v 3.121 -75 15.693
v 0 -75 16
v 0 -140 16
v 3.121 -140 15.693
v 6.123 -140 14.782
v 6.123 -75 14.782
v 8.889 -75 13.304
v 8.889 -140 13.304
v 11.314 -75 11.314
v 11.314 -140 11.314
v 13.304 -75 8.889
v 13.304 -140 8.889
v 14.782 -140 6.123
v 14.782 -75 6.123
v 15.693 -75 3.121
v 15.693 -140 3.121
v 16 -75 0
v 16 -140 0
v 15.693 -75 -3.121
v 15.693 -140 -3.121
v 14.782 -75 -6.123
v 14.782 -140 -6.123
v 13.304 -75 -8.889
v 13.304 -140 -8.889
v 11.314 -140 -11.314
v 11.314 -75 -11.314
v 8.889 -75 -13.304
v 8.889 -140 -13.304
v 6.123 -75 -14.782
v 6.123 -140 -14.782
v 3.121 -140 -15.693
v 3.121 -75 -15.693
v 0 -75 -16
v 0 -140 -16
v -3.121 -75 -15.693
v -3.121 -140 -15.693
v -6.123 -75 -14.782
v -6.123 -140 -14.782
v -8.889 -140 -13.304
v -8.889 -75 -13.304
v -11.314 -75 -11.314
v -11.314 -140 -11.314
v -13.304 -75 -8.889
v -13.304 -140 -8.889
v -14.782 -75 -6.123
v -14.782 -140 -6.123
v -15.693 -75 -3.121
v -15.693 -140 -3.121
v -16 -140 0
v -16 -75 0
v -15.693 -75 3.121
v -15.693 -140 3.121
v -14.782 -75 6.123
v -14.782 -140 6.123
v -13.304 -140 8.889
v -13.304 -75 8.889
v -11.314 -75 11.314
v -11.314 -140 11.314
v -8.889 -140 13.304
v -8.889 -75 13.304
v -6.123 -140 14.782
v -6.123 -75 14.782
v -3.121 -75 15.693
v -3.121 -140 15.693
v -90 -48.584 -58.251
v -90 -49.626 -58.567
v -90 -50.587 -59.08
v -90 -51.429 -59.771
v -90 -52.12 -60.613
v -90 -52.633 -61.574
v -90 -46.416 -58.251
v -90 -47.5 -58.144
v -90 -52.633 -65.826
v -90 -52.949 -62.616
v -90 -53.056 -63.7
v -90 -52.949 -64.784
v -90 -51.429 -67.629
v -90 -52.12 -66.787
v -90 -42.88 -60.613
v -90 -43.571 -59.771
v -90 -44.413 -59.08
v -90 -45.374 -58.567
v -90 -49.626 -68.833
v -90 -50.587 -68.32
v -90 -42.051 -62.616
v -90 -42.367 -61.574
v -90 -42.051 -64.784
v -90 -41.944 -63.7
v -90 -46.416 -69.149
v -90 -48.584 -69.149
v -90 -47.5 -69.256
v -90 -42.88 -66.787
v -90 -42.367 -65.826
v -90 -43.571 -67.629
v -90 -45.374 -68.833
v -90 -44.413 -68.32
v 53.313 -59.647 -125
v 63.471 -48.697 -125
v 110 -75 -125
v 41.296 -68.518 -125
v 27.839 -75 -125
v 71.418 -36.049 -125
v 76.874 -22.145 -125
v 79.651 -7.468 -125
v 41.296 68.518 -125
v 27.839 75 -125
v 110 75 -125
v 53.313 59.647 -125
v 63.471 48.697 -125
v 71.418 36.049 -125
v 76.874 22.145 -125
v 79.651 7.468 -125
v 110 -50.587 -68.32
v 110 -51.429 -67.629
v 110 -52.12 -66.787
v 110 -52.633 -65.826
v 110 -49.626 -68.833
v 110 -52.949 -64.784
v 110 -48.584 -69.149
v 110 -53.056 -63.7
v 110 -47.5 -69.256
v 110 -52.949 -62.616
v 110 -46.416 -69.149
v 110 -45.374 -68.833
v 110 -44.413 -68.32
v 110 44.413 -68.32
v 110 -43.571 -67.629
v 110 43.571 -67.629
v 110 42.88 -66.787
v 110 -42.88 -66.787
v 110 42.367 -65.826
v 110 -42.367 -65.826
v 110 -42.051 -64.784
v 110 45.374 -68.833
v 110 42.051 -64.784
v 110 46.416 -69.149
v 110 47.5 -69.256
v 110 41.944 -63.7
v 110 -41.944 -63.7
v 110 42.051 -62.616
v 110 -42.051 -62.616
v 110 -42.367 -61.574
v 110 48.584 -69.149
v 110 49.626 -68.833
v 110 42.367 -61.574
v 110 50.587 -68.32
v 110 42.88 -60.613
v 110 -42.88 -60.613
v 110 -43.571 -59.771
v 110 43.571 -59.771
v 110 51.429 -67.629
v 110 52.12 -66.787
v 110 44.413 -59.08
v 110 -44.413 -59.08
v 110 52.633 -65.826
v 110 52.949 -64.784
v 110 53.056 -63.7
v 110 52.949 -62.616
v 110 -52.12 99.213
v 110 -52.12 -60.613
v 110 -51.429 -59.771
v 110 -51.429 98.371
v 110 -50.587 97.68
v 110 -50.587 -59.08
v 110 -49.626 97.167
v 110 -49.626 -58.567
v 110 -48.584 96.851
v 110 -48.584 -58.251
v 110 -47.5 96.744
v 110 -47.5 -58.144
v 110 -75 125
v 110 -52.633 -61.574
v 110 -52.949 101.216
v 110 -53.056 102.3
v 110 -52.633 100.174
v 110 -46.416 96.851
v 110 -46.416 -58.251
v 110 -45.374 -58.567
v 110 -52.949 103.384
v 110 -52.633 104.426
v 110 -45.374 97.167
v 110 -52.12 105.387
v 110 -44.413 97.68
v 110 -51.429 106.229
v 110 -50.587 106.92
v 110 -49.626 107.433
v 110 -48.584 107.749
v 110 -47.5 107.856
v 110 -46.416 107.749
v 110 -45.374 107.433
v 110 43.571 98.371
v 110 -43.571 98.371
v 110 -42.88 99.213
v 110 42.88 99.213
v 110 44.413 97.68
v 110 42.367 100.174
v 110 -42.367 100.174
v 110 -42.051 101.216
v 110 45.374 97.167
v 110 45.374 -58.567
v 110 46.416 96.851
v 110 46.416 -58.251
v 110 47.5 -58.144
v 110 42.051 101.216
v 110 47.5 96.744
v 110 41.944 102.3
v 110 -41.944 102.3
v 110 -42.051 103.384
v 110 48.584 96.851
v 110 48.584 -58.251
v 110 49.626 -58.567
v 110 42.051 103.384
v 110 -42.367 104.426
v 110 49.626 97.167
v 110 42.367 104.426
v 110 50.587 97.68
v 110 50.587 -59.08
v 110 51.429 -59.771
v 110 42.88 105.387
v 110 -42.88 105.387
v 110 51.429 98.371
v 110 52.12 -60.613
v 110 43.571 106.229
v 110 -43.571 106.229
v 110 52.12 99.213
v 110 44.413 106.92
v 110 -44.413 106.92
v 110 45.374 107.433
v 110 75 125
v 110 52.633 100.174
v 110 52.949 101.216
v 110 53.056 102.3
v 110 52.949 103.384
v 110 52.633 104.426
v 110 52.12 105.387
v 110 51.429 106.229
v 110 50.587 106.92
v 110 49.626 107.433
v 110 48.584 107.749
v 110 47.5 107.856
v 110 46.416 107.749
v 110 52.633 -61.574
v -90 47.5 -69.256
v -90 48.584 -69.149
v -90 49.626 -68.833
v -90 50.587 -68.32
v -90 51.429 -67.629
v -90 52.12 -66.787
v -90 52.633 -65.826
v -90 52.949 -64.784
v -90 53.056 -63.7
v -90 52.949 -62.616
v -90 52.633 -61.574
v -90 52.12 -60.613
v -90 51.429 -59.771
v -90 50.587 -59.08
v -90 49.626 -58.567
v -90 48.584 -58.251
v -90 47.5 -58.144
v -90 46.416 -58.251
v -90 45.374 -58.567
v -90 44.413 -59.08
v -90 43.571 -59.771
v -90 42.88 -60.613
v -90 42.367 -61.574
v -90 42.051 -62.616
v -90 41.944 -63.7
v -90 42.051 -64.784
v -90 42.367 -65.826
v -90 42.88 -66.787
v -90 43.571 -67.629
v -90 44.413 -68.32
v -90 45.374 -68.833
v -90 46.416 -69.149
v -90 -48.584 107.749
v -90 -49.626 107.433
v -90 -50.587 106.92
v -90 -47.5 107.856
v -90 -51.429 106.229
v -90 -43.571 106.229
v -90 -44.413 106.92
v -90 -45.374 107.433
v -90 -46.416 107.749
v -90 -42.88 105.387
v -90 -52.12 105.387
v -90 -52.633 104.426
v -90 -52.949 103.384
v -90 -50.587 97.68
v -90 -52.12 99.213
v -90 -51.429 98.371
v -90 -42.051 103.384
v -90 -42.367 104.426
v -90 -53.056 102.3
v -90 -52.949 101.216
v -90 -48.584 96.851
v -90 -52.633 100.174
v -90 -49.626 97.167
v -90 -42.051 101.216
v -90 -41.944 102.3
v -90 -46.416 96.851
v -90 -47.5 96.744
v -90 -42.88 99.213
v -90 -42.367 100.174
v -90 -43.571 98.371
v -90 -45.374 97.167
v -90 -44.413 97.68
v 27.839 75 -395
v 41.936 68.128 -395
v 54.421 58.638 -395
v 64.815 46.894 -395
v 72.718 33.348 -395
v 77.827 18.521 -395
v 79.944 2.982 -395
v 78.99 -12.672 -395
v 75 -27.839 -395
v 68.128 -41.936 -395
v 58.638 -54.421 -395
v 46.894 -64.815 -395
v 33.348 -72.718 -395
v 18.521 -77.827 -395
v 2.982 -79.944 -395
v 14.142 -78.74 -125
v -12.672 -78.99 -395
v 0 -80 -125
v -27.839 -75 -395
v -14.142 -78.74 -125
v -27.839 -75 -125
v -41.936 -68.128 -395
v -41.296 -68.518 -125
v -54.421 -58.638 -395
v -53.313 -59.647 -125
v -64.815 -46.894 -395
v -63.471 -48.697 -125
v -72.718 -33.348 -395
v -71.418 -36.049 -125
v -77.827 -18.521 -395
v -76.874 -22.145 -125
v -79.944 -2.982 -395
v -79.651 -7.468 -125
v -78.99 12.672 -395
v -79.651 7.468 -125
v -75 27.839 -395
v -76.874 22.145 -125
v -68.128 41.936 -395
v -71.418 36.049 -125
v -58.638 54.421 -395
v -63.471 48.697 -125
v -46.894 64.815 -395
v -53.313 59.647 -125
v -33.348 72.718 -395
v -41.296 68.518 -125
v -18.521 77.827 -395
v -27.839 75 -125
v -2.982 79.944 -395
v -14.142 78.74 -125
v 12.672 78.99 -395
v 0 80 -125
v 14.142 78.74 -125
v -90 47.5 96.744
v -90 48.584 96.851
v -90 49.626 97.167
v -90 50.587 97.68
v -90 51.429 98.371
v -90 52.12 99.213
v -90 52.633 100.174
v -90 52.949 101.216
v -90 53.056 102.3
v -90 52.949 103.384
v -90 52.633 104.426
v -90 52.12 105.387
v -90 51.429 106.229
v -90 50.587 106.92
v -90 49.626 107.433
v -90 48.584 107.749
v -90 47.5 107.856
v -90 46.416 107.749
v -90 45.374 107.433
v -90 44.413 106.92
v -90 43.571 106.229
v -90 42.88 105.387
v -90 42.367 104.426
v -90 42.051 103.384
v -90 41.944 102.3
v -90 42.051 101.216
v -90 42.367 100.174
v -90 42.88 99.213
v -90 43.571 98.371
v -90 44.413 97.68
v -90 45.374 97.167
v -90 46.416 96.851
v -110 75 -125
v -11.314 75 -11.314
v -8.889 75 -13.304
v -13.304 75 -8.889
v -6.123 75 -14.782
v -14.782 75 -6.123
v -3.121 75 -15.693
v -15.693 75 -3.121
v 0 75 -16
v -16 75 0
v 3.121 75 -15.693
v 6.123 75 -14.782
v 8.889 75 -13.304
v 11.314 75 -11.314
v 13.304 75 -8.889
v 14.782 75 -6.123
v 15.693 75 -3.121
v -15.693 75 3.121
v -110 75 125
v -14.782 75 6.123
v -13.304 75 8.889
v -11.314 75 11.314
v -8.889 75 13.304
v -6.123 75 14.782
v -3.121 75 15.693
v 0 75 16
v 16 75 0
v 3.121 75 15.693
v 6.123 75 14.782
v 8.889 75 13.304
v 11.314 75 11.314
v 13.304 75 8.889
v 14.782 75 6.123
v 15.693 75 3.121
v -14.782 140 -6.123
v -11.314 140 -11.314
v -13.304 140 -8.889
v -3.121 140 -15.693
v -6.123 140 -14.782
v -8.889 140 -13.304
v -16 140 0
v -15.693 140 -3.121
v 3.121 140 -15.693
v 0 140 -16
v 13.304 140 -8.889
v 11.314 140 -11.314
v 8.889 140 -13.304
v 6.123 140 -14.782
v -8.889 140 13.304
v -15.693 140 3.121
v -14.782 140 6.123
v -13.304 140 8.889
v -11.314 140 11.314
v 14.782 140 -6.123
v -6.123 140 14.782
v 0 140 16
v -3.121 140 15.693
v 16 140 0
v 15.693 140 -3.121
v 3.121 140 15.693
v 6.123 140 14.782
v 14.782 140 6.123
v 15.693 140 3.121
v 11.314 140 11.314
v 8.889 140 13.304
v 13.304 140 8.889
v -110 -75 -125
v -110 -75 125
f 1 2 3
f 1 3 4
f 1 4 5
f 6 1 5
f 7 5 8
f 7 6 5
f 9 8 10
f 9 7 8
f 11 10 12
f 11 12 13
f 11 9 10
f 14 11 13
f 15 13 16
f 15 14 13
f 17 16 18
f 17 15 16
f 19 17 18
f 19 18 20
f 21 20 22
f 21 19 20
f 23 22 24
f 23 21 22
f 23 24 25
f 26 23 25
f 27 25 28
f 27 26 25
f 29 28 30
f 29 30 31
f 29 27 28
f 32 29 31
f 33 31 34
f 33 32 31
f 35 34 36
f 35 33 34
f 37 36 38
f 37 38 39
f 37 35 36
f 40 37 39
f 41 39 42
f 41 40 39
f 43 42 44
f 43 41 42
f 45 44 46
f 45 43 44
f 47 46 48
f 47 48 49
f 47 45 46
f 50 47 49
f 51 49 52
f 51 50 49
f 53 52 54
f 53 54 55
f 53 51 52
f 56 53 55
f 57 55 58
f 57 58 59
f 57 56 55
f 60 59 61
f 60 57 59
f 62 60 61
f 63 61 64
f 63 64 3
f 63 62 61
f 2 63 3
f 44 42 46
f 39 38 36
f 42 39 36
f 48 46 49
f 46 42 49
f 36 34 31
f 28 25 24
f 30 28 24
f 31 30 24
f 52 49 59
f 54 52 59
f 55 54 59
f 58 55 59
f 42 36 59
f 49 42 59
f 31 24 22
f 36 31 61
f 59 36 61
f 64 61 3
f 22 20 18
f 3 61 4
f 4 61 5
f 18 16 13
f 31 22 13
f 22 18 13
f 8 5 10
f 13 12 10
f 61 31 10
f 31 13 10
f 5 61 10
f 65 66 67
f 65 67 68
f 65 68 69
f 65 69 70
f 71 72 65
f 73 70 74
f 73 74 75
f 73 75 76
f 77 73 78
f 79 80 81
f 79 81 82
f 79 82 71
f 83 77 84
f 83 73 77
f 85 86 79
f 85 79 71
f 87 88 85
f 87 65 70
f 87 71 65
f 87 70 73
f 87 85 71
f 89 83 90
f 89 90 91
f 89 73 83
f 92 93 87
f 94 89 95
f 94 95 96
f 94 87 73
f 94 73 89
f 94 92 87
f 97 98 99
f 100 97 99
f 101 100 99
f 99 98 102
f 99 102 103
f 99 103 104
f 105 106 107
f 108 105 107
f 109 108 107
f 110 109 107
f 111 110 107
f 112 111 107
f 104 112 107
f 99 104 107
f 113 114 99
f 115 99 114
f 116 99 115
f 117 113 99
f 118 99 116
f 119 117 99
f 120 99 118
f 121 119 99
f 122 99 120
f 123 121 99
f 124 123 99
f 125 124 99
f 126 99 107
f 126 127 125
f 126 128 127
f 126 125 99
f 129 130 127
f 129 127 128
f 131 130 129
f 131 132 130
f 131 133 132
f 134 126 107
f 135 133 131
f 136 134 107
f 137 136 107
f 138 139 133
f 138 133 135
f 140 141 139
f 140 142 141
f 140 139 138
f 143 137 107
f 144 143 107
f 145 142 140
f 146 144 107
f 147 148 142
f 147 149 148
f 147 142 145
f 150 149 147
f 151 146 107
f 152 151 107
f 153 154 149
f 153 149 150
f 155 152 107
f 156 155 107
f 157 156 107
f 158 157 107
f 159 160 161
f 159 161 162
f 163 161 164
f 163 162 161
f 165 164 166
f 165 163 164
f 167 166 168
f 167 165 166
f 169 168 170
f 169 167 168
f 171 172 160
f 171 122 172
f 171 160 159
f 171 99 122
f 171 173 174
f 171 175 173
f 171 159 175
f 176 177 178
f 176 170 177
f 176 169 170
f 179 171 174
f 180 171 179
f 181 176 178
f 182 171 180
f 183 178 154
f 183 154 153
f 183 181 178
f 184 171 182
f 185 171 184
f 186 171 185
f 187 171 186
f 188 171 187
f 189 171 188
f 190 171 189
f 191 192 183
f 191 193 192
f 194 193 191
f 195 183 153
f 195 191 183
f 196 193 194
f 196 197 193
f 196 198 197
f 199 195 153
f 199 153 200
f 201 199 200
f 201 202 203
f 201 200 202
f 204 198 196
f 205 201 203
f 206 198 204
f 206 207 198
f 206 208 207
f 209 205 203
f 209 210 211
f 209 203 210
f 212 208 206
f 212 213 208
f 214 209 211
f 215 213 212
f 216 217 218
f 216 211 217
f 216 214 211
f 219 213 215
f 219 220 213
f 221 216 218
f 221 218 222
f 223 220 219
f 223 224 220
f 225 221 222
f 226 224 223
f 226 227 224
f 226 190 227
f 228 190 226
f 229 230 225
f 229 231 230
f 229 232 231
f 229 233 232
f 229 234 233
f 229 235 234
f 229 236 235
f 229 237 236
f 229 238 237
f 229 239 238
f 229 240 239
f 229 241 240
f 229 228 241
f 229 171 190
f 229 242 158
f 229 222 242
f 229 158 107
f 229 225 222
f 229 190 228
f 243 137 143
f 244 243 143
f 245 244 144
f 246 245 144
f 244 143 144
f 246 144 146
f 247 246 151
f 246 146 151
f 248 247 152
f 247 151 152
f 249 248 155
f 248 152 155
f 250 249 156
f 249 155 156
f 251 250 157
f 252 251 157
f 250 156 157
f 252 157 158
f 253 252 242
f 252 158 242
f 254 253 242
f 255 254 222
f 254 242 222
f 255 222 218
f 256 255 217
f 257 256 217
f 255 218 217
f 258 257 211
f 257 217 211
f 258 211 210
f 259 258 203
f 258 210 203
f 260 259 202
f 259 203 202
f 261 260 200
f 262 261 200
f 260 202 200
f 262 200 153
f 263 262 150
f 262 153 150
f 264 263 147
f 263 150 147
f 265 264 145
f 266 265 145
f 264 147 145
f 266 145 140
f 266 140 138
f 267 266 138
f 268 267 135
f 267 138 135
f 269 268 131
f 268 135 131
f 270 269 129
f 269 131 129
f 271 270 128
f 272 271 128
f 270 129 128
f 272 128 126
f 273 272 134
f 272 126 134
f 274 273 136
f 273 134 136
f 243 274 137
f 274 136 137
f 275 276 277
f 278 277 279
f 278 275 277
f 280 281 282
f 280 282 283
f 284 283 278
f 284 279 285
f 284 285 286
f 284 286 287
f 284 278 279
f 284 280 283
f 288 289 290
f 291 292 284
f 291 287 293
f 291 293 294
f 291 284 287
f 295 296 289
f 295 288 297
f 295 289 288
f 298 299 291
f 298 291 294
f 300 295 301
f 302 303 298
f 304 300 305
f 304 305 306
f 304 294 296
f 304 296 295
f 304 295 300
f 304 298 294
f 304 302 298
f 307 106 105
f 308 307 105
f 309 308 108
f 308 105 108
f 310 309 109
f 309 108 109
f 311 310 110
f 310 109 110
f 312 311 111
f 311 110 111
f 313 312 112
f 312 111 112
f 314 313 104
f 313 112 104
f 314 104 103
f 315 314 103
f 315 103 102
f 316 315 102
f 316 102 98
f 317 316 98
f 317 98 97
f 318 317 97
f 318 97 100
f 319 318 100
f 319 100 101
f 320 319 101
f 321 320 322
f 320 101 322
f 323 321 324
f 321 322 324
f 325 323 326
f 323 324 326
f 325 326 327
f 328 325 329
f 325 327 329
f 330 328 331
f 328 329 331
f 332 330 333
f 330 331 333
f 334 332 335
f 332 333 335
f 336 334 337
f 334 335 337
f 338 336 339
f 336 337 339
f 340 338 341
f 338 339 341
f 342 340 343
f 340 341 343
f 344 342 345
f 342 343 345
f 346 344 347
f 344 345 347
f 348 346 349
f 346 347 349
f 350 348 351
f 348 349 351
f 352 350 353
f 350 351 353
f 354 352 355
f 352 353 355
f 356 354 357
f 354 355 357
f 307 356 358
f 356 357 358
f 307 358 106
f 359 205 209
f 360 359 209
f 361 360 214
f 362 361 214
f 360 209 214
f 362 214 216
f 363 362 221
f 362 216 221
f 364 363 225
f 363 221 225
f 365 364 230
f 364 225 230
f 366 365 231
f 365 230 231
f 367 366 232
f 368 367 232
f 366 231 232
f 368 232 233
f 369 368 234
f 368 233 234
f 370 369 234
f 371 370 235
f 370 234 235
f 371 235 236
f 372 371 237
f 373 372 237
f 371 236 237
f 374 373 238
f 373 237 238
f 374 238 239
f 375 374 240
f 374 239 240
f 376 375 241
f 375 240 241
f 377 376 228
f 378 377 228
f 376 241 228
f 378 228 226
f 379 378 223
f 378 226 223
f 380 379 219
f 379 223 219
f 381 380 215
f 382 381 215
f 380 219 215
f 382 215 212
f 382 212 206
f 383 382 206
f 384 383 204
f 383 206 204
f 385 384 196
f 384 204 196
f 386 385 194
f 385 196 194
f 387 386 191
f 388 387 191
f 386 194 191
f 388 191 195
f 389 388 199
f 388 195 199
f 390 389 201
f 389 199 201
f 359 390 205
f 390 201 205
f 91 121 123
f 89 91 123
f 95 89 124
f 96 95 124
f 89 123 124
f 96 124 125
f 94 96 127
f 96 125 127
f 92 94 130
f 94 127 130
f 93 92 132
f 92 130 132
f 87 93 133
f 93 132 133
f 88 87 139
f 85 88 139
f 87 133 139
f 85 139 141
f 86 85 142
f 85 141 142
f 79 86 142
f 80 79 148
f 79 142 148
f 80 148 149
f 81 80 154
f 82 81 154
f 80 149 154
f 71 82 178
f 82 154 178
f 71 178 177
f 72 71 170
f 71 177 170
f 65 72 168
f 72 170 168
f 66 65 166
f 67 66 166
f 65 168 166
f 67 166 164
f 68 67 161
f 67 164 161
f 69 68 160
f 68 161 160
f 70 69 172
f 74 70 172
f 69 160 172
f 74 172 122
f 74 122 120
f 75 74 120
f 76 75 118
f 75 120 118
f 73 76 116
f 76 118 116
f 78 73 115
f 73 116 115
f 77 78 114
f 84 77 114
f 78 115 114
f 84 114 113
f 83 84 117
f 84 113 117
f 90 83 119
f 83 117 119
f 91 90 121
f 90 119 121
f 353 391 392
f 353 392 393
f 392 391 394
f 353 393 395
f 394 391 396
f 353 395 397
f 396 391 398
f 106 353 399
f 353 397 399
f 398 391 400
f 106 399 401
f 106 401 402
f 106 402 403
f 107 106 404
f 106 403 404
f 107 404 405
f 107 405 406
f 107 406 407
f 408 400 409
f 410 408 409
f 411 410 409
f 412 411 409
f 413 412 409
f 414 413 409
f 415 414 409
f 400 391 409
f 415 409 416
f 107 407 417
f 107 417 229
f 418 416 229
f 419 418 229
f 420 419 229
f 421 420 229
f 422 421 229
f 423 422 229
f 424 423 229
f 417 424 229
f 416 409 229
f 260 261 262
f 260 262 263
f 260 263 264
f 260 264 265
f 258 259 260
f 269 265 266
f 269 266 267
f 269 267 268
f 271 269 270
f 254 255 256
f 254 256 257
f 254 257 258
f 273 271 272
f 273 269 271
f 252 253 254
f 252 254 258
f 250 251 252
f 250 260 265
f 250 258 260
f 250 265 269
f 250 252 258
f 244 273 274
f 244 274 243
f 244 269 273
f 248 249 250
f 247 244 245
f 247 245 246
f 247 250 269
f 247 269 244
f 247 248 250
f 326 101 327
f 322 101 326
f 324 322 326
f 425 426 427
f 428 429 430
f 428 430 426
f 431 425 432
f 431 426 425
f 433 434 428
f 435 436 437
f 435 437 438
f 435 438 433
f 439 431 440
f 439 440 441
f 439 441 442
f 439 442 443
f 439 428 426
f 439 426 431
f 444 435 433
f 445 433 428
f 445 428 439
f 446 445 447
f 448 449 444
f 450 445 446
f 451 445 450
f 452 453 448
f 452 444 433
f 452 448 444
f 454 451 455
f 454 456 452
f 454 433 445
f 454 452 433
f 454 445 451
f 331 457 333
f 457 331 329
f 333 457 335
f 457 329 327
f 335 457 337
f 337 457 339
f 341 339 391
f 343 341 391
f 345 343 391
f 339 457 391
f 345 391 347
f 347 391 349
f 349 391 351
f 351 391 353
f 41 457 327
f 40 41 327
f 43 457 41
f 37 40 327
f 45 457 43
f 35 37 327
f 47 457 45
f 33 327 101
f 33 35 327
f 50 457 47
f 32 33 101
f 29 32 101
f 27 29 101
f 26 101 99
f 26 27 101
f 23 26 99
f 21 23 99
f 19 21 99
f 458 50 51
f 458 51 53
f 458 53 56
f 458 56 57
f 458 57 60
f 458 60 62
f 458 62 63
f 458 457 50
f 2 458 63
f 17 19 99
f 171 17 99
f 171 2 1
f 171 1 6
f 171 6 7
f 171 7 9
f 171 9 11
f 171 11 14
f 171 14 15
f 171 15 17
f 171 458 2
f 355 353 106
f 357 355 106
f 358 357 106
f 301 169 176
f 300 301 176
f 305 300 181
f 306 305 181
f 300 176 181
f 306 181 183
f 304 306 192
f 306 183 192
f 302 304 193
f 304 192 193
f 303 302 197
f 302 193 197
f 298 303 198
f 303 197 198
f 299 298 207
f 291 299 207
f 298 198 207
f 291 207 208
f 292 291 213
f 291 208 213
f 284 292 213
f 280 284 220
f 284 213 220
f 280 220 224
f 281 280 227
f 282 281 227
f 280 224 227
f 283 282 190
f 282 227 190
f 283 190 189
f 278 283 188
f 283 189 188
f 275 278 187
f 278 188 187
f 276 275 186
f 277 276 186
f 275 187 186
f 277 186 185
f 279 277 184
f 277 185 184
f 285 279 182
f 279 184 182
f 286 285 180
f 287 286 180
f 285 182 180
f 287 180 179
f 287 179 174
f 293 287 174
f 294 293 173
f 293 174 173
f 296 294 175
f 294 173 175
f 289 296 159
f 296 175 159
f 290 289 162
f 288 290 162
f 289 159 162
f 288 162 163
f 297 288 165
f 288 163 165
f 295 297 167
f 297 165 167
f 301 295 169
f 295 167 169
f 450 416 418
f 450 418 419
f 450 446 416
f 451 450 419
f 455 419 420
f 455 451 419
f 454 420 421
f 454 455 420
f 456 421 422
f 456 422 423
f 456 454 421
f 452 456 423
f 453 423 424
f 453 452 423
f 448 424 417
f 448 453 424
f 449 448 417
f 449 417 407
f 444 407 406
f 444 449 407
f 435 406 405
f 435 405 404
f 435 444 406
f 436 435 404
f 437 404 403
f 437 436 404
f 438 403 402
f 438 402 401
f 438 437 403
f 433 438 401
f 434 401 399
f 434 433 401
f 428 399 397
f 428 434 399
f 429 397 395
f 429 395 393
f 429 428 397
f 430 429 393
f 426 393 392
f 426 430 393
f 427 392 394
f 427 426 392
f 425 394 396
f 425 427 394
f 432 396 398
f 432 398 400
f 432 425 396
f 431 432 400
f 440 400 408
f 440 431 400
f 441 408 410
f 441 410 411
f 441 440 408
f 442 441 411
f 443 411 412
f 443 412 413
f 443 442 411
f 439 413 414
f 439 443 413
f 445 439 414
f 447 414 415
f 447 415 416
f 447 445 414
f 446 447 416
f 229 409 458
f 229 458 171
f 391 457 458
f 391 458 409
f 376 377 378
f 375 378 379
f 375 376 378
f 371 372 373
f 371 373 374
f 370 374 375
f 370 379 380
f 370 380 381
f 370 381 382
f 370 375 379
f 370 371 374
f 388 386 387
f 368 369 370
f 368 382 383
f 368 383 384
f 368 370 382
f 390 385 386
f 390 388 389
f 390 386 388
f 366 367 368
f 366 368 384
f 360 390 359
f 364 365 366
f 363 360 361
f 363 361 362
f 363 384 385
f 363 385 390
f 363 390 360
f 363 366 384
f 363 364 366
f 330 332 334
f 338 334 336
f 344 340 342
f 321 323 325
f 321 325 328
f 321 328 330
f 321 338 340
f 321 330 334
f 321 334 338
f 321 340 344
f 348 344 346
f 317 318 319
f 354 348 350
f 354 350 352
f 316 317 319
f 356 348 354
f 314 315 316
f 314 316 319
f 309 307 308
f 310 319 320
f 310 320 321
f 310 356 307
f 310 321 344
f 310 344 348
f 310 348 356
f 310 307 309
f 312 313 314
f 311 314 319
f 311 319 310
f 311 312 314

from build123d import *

# Parameters (mm, degrees)
CROQUIS1_W              = 220
CROQUIS1_H              = 150
SALIENTE_EXTRUIR1_DEPTH = 125
CROQUIS2_R              = 16
SALIENTE_EXTRUIR2_DEPTH = 140
CROQUIS3_R              = 5.55625
CORTAR_EXTRUIR1_DEPTH   = 200
CROQUIS4_R              = 80
SALIENTE_EXTRUIR3_DEPTH = 270


with BuildPart() as part:
    # Croquis1 → Saliente-Extruir1 (new, symmetric)
    with BuildSketch(Plane.XY):
        Rectangle(CROQUIS1_W, CROQUIS1_H)
    extrude(amount=SALIENTE_EXTRUIR1_DEPTH, both=True)

    # Croquis2 → Saliente-Extruir2 (add, symmetric)
    with BuildSketch(Plane(origin=(0, 0, 0), x_dir=(1, 0, 0), z_dir=(0, 1, 0))):
        with Locations(Location((0, 0, 0), (0, 0, 270))):
            Circle(CROQUIS2_R)
    extrude(amount=SALIENTE_EXTRUIR2_DEPTH, both=True)

    # Croquis3 → Cortar-Extruir1 (cut)
    with BuildSketch(Plane(origin=(110, 0, 0), x_dir=(0, 0, -1), z_dir=(1, 0, 0))):
        with Locations((-102.3, 47.5)):
            Circle(CROQUIS3_R)
        with Locations((-102.3, -47.5)):
            Circle(CROQUIS3_R)
        with Locations((63.7, 47.5)):
            Circle(CROQUIS3_R)
        with Locations((63.7, -47.5)):
            Circle(CROQUIS3_R)
    extrude(amount=-CORTAR_EXTRUIR1_DEPTH, mode=Mode.SUBTRACT)

    # Croquis4 → Saliente-Extruir3 (add)
    with BuildSketch(Plane(origin=(0, 0, -125), x_dir=(-1, 0, 0), z_dir=(0, 0, -1))):
        with Locations(Location((0, 0, 0), (0, 0, 110.364134806))):
            Circle(CROQUIS4_R)
    extrude(amount=SALIENTE_EXTRUIR3_DEPTH)


solid = part.part
